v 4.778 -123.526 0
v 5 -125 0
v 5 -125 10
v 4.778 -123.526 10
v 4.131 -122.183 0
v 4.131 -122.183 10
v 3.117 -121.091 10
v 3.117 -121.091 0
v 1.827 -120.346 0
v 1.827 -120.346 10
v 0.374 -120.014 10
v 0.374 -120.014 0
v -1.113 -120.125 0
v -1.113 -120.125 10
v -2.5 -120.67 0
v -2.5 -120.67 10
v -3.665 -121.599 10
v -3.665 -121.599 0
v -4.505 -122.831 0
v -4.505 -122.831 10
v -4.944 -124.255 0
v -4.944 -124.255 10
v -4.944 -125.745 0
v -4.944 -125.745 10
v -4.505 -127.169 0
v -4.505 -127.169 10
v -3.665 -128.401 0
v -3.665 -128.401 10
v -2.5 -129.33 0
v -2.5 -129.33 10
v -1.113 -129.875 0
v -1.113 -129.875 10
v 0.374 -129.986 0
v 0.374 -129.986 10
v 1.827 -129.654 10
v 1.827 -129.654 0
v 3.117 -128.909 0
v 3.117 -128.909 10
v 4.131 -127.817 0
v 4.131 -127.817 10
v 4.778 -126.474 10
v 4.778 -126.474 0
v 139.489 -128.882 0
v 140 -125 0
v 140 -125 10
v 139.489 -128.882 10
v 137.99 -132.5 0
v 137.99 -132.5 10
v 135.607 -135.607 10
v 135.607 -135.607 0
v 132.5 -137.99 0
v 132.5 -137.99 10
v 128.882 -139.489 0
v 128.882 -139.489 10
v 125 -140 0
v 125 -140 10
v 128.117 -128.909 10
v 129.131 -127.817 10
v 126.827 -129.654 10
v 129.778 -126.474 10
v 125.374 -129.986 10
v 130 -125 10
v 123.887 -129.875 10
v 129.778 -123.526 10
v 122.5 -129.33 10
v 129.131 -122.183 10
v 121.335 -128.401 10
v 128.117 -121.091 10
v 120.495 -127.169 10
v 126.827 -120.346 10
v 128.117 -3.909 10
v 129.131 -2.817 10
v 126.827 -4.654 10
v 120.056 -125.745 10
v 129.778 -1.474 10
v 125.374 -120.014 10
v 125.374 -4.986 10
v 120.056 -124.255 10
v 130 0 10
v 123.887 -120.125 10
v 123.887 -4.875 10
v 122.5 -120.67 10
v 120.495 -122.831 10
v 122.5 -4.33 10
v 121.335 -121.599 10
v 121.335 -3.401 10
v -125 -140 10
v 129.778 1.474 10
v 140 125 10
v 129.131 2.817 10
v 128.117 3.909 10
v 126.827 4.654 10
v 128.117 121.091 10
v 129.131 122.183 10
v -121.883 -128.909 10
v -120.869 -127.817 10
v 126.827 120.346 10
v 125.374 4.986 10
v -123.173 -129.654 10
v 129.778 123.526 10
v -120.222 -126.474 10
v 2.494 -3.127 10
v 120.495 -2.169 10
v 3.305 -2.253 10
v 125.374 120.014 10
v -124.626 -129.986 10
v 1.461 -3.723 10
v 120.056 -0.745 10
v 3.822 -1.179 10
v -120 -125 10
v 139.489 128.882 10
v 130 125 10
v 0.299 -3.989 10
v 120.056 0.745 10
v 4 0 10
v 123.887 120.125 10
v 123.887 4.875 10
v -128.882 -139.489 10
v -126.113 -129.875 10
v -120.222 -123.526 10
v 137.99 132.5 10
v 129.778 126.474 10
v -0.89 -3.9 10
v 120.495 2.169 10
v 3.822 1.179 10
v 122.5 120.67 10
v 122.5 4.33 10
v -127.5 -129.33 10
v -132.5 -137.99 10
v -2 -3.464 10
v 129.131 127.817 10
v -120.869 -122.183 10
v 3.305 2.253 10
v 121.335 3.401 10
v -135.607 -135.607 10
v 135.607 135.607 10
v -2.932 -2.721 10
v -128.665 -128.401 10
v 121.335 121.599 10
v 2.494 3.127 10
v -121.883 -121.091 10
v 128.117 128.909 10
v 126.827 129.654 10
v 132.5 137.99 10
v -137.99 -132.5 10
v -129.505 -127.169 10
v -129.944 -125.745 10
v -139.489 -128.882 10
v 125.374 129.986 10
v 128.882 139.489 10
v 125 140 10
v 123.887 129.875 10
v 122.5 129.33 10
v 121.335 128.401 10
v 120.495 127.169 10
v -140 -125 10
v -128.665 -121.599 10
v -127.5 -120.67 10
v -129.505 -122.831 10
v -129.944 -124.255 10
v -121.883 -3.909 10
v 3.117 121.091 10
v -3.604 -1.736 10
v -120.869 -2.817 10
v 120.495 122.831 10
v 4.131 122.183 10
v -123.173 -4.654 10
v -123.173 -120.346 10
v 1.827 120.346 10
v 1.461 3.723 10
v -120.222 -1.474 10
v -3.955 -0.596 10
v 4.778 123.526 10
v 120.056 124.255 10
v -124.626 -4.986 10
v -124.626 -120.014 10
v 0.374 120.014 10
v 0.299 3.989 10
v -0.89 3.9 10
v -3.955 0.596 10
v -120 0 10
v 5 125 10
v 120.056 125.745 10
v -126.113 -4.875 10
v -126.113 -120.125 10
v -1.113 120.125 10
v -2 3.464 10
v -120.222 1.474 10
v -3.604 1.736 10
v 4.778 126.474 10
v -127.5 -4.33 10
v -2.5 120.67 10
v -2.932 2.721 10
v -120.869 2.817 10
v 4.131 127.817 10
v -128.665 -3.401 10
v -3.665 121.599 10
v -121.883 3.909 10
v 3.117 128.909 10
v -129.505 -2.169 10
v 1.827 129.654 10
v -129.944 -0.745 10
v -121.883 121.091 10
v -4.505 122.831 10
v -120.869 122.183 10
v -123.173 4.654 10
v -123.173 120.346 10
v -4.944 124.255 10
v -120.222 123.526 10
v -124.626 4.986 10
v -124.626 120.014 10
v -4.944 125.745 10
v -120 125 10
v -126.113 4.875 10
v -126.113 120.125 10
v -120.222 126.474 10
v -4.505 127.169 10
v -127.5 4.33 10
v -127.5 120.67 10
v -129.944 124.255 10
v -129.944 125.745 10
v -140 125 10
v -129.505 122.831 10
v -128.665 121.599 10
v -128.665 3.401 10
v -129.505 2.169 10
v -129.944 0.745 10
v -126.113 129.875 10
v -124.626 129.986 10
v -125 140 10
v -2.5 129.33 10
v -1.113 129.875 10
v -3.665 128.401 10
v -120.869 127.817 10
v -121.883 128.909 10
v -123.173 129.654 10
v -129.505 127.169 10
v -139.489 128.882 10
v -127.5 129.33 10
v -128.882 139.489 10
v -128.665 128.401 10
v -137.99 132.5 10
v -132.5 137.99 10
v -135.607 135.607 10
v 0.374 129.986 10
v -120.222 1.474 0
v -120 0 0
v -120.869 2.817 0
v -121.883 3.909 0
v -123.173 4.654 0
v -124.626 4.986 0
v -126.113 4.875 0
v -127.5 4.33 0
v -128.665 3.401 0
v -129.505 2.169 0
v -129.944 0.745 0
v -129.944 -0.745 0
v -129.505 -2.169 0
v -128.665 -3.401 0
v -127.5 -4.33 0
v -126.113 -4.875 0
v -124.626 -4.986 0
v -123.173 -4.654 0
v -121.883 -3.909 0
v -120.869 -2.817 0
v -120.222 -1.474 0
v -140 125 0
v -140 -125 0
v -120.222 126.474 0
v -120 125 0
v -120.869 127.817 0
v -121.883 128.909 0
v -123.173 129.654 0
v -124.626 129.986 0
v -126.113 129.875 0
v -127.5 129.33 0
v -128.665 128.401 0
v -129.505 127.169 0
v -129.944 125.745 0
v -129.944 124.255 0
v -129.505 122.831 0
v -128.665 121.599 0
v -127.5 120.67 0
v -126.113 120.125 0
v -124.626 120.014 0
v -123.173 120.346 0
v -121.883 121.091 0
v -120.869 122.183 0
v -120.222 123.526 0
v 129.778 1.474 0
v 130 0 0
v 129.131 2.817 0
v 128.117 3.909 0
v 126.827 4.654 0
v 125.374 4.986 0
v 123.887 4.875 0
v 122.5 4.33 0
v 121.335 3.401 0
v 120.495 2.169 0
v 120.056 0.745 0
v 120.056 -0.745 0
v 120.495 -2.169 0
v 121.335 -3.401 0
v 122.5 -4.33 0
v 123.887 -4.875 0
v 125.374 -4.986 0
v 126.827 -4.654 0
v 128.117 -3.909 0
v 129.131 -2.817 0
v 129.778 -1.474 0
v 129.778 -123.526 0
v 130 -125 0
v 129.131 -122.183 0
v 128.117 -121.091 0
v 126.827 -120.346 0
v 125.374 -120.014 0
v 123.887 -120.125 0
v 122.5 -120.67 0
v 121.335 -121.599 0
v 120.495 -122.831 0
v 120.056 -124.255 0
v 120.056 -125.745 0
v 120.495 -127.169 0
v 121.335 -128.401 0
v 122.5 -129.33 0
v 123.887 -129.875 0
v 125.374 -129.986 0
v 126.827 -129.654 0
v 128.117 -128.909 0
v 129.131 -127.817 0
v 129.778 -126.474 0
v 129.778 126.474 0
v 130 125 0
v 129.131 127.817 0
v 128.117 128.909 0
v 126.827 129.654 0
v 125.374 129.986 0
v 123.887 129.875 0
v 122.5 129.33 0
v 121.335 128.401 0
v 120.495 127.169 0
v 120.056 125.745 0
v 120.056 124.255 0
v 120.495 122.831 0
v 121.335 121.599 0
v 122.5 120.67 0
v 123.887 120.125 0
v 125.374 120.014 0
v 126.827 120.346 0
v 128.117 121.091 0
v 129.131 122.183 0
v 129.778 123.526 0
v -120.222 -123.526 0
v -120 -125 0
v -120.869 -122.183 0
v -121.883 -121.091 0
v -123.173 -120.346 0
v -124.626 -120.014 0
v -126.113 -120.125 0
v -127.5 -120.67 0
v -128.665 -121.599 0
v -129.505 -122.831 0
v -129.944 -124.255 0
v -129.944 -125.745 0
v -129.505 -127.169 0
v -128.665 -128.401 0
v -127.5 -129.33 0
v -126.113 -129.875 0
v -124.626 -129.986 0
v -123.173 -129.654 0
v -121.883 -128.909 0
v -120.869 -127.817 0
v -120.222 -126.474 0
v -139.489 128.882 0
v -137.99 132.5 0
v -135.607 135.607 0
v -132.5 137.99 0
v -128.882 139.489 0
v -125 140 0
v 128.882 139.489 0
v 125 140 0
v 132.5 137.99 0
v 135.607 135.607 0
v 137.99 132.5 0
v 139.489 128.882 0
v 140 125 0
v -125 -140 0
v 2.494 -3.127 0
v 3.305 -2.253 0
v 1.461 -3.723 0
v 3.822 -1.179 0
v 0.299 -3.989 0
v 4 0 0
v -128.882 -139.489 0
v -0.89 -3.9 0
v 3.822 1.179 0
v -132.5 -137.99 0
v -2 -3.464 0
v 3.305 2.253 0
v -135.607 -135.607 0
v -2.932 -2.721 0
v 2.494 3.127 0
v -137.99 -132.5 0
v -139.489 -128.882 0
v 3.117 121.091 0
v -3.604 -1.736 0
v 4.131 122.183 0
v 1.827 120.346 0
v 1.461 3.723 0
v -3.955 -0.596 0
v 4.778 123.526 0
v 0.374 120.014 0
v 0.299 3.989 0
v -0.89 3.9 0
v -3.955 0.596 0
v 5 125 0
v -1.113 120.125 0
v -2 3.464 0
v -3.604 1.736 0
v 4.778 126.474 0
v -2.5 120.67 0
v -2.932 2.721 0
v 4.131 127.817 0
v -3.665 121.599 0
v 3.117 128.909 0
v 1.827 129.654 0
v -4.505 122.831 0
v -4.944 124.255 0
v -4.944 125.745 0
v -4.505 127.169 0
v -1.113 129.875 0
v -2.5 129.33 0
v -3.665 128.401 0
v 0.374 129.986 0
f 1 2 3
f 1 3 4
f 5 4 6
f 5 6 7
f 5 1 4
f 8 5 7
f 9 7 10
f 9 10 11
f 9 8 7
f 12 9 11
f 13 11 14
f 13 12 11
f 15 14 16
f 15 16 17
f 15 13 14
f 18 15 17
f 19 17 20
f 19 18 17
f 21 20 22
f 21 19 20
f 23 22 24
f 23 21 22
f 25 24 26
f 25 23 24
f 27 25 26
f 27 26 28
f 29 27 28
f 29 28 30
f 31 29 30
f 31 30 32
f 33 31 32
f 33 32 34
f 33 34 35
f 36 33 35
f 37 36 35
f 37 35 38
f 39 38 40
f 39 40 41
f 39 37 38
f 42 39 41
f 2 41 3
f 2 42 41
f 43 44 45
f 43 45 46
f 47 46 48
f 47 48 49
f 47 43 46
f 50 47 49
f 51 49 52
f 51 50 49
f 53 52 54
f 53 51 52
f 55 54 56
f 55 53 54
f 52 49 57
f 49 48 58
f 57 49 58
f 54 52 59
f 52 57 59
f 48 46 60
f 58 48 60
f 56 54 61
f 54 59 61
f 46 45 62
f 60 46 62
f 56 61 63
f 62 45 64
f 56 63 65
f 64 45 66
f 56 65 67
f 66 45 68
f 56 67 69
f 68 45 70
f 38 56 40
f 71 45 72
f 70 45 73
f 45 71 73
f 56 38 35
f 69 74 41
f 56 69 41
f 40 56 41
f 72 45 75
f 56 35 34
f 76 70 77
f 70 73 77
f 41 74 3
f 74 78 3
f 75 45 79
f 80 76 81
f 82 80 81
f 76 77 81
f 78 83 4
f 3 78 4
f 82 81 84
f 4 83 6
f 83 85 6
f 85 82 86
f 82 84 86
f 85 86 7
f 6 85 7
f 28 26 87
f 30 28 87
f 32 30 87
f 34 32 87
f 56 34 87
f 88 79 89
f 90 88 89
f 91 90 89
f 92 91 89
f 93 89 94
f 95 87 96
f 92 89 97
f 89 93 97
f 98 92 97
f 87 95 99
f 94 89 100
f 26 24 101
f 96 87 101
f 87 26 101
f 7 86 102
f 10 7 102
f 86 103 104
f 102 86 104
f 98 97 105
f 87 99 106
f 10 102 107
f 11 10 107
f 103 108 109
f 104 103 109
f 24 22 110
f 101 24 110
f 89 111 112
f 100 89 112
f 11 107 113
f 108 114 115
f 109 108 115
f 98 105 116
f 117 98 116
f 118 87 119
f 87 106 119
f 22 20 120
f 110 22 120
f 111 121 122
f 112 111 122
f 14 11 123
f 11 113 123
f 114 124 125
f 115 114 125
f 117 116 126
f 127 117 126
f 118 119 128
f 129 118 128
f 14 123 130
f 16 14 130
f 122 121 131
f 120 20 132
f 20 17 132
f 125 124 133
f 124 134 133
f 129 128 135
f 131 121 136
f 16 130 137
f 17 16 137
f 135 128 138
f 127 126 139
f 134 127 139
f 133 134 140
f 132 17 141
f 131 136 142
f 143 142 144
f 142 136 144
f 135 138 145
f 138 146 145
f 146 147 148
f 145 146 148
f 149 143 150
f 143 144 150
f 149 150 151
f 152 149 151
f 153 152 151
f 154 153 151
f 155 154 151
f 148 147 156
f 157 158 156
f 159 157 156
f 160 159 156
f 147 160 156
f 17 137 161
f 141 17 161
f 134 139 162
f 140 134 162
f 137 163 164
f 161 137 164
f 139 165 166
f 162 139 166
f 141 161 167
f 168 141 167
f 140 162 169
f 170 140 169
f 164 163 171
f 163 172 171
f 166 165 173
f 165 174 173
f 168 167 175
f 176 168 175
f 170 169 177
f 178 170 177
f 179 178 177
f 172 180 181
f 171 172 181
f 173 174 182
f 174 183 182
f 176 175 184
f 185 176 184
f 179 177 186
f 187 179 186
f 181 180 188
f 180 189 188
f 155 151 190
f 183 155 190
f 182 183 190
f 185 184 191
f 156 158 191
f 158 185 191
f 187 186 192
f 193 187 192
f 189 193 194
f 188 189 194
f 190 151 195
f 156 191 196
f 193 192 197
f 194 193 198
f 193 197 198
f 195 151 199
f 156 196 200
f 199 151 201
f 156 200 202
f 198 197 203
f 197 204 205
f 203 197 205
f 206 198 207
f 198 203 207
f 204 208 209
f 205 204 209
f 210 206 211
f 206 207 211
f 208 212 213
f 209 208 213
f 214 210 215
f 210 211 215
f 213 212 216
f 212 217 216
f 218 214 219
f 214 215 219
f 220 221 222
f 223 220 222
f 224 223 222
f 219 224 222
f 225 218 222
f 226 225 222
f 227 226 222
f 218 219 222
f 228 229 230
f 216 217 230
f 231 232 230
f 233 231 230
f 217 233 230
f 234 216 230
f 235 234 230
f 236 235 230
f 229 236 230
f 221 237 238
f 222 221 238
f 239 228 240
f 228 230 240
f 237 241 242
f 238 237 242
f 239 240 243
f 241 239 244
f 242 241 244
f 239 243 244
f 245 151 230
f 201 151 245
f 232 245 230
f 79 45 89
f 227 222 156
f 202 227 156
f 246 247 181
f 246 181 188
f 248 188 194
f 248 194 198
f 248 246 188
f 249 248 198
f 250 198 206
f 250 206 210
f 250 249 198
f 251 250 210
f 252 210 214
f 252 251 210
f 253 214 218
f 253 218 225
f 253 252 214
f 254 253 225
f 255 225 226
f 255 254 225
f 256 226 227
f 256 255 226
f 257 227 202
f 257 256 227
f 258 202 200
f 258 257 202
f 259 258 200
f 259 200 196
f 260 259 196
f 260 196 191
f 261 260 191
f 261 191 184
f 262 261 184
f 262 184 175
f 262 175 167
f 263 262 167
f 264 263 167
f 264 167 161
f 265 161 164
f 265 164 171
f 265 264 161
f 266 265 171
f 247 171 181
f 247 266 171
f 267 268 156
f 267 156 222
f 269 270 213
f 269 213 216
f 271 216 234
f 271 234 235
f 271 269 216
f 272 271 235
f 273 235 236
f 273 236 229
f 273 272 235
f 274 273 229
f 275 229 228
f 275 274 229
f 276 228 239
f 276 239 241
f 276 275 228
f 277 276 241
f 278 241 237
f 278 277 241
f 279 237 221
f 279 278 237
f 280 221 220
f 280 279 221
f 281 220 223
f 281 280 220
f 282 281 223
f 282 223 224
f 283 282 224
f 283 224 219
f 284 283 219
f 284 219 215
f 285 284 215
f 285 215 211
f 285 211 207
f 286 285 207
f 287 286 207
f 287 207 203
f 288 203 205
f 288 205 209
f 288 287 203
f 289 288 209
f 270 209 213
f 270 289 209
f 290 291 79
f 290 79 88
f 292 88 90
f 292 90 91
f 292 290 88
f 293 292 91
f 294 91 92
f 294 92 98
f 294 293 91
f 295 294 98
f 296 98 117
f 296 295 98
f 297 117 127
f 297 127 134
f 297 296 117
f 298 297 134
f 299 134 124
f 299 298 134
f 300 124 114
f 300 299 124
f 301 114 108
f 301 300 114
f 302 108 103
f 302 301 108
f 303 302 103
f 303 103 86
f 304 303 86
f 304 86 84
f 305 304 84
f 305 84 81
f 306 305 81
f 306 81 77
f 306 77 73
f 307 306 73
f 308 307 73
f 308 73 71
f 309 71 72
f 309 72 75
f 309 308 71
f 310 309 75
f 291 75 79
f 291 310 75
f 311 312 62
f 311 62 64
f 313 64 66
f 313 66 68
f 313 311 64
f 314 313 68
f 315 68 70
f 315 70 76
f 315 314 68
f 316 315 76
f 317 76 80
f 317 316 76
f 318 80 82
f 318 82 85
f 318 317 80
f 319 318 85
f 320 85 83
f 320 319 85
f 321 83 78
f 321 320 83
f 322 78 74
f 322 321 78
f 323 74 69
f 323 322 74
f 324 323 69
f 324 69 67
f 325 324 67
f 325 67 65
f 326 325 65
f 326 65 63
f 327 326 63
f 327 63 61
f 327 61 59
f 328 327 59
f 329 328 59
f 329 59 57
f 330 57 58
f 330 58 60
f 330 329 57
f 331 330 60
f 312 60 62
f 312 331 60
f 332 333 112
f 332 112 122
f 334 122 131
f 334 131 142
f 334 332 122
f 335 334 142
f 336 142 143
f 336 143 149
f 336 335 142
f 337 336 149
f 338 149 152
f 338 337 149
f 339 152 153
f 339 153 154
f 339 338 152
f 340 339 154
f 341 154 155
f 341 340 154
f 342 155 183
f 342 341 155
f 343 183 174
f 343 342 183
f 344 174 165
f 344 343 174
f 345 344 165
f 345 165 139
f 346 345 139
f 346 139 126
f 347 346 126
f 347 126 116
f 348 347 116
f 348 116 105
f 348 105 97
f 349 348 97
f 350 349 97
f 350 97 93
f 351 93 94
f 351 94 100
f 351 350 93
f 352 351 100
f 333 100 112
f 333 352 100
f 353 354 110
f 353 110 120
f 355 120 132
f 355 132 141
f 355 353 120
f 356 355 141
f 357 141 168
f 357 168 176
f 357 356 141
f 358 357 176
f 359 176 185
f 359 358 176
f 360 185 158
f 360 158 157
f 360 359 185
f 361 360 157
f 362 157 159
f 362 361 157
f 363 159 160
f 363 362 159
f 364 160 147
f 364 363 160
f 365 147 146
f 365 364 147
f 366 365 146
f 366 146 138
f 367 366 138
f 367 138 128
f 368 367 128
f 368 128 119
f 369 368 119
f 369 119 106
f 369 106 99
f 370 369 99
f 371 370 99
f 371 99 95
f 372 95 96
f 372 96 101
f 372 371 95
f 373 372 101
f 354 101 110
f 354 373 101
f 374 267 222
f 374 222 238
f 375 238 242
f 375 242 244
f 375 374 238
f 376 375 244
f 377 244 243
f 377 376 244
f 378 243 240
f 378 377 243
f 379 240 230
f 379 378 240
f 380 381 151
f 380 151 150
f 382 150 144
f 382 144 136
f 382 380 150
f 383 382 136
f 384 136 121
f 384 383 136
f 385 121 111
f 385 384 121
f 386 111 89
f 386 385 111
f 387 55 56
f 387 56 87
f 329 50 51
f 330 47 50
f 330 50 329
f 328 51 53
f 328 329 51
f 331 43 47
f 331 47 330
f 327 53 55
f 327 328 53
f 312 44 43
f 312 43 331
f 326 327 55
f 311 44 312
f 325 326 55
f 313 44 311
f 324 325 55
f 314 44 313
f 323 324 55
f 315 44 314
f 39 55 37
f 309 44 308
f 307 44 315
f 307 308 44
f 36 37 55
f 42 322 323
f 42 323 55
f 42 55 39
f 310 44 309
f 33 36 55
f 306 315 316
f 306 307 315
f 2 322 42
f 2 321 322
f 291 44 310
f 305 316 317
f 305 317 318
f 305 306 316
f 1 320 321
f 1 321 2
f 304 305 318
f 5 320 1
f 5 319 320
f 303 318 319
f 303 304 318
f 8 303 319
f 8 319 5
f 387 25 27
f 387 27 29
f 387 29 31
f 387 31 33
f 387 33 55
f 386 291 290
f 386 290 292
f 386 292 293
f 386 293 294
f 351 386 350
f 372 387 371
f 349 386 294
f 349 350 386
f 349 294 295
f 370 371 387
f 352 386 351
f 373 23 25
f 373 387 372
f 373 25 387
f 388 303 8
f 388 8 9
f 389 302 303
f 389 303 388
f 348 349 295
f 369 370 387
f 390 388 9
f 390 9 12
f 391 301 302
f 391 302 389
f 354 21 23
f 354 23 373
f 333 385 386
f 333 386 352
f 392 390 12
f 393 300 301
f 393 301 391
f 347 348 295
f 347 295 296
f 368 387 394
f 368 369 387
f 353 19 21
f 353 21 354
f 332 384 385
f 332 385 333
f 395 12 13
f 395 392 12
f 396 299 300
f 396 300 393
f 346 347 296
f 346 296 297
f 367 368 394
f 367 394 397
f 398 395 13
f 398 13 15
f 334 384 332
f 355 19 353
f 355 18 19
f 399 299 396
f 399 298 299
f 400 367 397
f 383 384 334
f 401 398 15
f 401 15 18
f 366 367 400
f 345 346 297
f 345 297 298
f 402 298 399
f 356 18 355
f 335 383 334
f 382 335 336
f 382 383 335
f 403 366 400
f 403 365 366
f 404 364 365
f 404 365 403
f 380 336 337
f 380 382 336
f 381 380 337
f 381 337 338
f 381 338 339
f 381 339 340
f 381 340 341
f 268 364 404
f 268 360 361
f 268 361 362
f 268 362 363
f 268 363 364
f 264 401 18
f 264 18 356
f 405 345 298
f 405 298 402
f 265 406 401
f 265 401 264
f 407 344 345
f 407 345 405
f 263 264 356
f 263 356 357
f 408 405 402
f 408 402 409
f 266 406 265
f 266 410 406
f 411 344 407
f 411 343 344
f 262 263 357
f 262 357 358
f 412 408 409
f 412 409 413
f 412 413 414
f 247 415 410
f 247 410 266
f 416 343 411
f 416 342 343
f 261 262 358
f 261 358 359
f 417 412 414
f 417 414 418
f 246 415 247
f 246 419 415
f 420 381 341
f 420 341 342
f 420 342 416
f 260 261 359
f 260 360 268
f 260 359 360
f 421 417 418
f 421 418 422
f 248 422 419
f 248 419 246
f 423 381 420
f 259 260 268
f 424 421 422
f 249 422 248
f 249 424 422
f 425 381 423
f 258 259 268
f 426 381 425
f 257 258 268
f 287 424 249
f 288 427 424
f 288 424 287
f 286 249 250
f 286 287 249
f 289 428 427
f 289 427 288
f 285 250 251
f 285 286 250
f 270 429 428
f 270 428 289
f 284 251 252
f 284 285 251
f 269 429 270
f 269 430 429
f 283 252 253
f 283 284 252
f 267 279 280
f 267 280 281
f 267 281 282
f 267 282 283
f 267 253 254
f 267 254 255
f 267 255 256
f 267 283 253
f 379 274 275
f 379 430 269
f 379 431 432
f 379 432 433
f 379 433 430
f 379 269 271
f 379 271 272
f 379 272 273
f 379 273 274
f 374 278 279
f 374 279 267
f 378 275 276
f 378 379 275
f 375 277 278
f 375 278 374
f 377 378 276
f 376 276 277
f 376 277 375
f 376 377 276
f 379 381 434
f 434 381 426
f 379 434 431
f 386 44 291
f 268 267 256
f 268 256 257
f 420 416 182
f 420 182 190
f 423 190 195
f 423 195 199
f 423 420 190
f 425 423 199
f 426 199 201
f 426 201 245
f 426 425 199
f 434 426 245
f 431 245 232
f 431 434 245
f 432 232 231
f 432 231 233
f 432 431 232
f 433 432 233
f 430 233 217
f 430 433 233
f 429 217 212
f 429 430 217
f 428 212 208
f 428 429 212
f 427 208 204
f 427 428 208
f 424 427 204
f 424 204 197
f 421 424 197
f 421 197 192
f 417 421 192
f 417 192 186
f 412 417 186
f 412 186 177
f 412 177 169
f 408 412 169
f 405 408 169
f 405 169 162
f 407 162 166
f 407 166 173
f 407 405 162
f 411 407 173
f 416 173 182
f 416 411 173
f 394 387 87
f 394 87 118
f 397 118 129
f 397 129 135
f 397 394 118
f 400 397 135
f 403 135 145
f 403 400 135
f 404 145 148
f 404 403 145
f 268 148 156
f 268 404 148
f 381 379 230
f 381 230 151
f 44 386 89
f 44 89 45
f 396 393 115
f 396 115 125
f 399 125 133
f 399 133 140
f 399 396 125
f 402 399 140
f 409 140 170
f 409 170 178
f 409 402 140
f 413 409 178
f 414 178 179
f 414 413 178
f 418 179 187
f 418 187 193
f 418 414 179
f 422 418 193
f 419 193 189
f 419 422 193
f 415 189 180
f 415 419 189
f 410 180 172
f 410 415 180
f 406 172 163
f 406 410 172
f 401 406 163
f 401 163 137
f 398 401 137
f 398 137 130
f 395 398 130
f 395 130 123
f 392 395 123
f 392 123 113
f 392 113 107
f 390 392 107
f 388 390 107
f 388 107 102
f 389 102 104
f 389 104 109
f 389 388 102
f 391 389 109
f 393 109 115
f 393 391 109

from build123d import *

# Parameters (mm, degrees)
SKETCH2_R           = 5
SKETCH2_R_2         = 4
BOSS_EXTRUDE1_DEPTH = 10


with BuildPart() as part:
    # Sketch2 → Boss-Extrude1 (new body)
    with BuildSketch(Plane.XY):
        with BuildLine():
            Line((-125, 140), (125, 140))
            ThreePointArc((125, 140), (135.606601718, 135.606601718), (140, 125))
            Line((140, 125), (140, -125))
            ThreePointArc((140, -125), (135.606601718, -135.606601718), (125, -140))
            Line((125, -140), (-125, -140))
            ThreePointArc((-125, -140), (-135.606601718, -135.606601718), (-140, -125))
            Line((-140, -125), (-140, 125))
            ThreePointArc((-140, 125), (-135.606601718, 135.606601718), (-125, 140))
        make_face()
        with Locations((-125, 125)):
            Circle(SKETCH2_R, mode=Mode.SUBTRACT)
        with Locations((0, 125)):
            Circle(SKETCH2_R, mode=Mode.SUBTRACT)
        with Locations((125, 125)):
            Circle(SKETCH2_R, mode=Mode.SUBTRACT)
        Circle(SKETCH2_R_2, mode=Mode.SUBTRACT)
        with Locations((125, 0)):
            Circle(SKETCH2_R, mode=Mode.SUBTRACT)
        with Locations((-125, 0)):
            Circle(SKETCH2_R, mode=Mode.SUBTRACT)
        with Locations((-125, -125)):
            Circle(SKETCH2_R, mode=Mode.SUBTRACT)
        with Locations((0, -125)):
            Circle(SKETCH2_R, mode=Mode.SUBTRACT)
        with Locations((125, -125)):
            Circle(SKETCH2_R, mode=Mode.SUBTRACT)
    extrude(amount=BOSS_EXTRUDE1_DEPTH)


solid = part.part
